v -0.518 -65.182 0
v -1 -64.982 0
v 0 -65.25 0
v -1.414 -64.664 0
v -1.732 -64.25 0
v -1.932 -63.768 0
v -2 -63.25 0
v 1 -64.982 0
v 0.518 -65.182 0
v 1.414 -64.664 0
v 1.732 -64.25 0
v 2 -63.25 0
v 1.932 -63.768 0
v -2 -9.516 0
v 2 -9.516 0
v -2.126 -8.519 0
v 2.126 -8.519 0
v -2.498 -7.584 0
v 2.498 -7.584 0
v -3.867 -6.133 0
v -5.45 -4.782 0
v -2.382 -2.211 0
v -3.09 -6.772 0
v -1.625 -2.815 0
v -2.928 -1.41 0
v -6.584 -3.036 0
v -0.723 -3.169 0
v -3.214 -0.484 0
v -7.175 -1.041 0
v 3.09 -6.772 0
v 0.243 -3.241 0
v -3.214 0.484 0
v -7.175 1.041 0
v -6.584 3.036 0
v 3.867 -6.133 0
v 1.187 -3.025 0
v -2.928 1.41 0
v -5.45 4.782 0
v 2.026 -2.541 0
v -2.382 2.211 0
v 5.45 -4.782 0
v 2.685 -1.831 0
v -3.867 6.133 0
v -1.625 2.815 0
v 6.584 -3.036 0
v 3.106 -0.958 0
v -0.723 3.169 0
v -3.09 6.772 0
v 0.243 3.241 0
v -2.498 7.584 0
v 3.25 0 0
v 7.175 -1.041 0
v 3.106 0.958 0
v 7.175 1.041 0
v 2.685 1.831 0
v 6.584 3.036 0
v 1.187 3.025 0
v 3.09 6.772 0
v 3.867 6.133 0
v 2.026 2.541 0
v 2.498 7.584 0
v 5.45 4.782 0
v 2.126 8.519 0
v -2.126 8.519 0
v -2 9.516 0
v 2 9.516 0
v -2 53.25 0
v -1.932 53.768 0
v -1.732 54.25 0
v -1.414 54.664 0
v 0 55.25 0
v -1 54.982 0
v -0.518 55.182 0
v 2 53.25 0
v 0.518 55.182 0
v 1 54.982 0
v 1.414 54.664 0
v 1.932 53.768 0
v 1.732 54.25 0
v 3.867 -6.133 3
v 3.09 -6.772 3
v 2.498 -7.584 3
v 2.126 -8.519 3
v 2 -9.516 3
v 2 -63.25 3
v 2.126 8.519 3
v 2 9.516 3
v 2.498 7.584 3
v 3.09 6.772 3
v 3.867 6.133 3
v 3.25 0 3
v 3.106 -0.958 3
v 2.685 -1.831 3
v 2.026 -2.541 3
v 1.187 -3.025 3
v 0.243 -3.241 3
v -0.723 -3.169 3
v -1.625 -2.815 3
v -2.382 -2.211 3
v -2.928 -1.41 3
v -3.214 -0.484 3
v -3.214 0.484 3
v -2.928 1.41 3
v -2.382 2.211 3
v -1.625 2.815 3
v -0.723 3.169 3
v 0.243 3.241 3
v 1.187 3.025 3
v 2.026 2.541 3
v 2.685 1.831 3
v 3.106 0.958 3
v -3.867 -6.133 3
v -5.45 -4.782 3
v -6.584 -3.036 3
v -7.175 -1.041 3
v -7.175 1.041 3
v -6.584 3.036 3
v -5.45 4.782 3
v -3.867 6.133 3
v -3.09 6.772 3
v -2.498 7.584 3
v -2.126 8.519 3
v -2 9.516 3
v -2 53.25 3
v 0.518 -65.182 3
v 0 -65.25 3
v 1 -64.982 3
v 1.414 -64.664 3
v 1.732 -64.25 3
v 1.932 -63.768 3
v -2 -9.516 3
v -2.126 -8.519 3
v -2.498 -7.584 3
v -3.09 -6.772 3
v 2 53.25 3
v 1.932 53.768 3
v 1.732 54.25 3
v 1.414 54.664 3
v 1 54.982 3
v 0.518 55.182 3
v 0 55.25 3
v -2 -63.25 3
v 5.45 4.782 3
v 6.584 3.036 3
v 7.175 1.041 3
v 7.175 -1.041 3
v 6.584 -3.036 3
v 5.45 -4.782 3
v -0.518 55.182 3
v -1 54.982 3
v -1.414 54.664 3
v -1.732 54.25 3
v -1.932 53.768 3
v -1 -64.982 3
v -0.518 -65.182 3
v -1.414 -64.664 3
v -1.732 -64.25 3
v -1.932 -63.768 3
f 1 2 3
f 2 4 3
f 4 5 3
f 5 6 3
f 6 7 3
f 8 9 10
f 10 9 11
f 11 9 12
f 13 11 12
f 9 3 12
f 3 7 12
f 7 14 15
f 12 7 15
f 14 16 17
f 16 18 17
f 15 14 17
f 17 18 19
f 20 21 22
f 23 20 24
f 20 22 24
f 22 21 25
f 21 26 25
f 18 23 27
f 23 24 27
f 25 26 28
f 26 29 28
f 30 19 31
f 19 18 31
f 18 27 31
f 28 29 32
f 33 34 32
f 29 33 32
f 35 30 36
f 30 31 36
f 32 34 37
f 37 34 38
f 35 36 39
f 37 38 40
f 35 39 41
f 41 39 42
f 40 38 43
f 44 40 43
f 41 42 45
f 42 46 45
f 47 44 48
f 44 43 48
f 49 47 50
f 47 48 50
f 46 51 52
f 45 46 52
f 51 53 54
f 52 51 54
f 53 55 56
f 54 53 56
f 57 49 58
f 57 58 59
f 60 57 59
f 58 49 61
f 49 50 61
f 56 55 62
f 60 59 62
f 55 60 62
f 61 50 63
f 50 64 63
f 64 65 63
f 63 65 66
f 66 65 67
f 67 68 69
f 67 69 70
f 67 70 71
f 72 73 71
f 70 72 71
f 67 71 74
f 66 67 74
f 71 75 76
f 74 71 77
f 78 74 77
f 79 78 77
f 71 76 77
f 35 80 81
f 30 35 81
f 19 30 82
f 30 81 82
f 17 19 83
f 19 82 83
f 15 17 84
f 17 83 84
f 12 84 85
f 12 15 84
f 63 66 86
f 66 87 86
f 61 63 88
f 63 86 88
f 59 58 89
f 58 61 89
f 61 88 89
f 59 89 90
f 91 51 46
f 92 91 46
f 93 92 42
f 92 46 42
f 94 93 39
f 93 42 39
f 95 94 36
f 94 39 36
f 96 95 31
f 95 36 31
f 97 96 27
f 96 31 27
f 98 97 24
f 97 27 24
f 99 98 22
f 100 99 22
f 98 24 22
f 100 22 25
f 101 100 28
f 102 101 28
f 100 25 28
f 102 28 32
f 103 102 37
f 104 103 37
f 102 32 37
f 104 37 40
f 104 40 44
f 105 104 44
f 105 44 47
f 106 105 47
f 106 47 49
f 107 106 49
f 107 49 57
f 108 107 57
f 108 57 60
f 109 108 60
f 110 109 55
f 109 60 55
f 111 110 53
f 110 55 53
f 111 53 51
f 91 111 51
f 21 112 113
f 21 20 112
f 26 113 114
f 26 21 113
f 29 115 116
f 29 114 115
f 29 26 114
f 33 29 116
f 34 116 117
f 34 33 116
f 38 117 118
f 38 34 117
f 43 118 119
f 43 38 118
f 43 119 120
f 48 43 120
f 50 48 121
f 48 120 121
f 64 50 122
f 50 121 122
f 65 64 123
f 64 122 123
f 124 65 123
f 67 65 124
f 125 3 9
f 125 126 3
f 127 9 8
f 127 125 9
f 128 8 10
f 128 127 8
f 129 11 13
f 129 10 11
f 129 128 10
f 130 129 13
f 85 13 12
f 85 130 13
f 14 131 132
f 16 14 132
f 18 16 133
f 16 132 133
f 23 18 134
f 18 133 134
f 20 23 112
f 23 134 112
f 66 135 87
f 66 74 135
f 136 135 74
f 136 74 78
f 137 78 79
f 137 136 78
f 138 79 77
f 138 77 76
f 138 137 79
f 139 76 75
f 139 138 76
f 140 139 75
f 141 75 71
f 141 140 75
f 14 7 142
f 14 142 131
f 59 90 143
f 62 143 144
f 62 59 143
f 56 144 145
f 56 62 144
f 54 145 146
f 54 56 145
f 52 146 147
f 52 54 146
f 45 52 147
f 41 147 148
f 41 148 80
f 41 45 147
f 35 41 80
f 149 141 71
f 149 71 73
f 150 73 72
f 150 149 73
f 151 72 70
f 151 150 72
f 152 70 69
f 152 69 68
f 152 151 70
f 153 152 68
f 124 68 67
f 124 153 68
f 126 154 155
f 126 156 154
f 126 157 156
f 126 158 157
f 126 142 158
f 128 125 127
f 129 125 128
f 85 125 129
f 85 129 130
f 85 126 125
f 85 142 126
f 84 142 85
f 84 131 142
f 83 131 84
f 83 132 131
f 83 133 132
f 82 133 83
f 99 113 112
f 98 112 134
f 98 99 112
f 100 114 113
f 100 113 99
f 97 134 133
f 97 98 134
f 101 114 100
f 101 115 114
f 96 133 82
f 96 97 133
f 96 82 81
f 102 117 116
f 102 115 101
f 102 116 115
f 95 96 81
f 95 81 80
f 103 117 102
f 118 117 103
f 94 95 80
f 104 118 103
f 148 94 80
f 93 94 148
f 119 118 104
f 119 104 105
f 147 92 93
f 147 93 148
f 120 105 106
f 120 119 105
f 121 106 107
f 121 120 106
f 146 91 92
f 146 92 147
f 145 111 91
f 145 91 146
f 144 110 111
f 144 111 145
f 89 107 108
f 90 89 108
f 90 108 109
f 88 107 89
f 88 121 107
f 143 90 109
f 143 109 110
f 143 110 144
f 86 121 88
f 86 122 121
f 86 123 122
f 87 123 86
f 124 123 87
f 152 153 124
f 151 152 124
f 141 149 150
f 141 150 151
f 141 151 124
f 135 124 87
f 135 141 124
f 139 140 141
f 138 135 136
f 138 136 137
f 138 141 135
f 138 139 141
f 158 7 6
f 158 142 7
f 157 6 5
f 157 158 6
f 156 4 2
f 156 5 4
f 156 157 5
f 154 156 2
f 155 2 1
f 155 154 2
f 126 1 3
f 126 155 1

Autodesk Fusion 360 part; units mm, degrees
sketch "Mixer arm" plane through (0, 0, 0) normal (0, 0, 1) x (1, 0, 0)
  circle A0 centre (0, 0) radius 7.25
  circle A1 centre (0, 0) radius 3.25
  line L0 (-2, 55.25) -> (2, 55.25)
  line L1 (2, 55.25) -> (2, 3.25)
  line L2 (2, 3.25) -> (-2, 3.25)
  line L3 (-2, 3.25) -> (-2, 55.25)
  line L4 (-2, -3.25) -> (2, -3.25)
  line L5 (2, -3.25) -> (2, -65.25)
  line L6 (2, -65.25) -> (-2, -65.25)
  line L7 (-2, -65.25) -> (-2, -3.25)
  line L8 (-2, -7.25) -> (2, -7.25)
  line L9 (-2, 7.25) -> (2, 7.25)
  dimension "d3" = 6.5
  dimension "d5" = 14.5
  dimension "d6" = 2
  dimension "d7" = 2
  dimension "d8" = 2
  dimension "d9" = 2
  dimension "d14" = 58
  dimension "d15" = 48
extrude "Extrude1" add sketch "Mixer arm" along normal blind 3 contours A0 A1 L1 L2 L4 L5 | A0 L1 L2 L3 | A0 L1 L9 | A0 L5 L8 | A0 L4 L5 L7 | A0 L3 L9 | L0 L1 L3 L9 | A0 L7 L8 | L5 L6 L7 L8 | A0 A1 L2 L3 L4 L7
fillet "Fillet1" radius 4 4 edges at (2, -6.9687, 1.5) (2, 6.9687, 1.5) (-2, 6.9687, 1.5) (-2, -6.9687, 1.5)
fillet "Fillet2" radius 2 4 edges at (2, 55.25, 1.5) (-2, 55.25, 1.5) (-2, -65.25, 1.5) (2, -65.25, 1.5)
equation "stainless_steel_thickness = 3 mm" comment "The thickness of the 316 stainless steel sheets to laser cut."
equation "hole_diameter = 6.5 mm"
equation "d3 = hole_diameter"
equation "arm_thickness = 4 mm"
equation "d5 = hole_diameter + 2 * arm_thickness"
equation "d6 = arm_thickness / 2"
equation "d7 = arm_thickness / 2"
equation "d8 = arm_thickness / 2"
equation "d9 = arm_thickness / 2"
equation "d10 = stainless_steel_thickness"
equation "arm_length_front = 58 mm"
equation "arm_length_back = 48 mm"
equation "d14 = arm_length_front"
equation "d15 = arm_length_back"
equation "d17 = arm_thickness"
equation "d19 = arm_thickness / 2"
